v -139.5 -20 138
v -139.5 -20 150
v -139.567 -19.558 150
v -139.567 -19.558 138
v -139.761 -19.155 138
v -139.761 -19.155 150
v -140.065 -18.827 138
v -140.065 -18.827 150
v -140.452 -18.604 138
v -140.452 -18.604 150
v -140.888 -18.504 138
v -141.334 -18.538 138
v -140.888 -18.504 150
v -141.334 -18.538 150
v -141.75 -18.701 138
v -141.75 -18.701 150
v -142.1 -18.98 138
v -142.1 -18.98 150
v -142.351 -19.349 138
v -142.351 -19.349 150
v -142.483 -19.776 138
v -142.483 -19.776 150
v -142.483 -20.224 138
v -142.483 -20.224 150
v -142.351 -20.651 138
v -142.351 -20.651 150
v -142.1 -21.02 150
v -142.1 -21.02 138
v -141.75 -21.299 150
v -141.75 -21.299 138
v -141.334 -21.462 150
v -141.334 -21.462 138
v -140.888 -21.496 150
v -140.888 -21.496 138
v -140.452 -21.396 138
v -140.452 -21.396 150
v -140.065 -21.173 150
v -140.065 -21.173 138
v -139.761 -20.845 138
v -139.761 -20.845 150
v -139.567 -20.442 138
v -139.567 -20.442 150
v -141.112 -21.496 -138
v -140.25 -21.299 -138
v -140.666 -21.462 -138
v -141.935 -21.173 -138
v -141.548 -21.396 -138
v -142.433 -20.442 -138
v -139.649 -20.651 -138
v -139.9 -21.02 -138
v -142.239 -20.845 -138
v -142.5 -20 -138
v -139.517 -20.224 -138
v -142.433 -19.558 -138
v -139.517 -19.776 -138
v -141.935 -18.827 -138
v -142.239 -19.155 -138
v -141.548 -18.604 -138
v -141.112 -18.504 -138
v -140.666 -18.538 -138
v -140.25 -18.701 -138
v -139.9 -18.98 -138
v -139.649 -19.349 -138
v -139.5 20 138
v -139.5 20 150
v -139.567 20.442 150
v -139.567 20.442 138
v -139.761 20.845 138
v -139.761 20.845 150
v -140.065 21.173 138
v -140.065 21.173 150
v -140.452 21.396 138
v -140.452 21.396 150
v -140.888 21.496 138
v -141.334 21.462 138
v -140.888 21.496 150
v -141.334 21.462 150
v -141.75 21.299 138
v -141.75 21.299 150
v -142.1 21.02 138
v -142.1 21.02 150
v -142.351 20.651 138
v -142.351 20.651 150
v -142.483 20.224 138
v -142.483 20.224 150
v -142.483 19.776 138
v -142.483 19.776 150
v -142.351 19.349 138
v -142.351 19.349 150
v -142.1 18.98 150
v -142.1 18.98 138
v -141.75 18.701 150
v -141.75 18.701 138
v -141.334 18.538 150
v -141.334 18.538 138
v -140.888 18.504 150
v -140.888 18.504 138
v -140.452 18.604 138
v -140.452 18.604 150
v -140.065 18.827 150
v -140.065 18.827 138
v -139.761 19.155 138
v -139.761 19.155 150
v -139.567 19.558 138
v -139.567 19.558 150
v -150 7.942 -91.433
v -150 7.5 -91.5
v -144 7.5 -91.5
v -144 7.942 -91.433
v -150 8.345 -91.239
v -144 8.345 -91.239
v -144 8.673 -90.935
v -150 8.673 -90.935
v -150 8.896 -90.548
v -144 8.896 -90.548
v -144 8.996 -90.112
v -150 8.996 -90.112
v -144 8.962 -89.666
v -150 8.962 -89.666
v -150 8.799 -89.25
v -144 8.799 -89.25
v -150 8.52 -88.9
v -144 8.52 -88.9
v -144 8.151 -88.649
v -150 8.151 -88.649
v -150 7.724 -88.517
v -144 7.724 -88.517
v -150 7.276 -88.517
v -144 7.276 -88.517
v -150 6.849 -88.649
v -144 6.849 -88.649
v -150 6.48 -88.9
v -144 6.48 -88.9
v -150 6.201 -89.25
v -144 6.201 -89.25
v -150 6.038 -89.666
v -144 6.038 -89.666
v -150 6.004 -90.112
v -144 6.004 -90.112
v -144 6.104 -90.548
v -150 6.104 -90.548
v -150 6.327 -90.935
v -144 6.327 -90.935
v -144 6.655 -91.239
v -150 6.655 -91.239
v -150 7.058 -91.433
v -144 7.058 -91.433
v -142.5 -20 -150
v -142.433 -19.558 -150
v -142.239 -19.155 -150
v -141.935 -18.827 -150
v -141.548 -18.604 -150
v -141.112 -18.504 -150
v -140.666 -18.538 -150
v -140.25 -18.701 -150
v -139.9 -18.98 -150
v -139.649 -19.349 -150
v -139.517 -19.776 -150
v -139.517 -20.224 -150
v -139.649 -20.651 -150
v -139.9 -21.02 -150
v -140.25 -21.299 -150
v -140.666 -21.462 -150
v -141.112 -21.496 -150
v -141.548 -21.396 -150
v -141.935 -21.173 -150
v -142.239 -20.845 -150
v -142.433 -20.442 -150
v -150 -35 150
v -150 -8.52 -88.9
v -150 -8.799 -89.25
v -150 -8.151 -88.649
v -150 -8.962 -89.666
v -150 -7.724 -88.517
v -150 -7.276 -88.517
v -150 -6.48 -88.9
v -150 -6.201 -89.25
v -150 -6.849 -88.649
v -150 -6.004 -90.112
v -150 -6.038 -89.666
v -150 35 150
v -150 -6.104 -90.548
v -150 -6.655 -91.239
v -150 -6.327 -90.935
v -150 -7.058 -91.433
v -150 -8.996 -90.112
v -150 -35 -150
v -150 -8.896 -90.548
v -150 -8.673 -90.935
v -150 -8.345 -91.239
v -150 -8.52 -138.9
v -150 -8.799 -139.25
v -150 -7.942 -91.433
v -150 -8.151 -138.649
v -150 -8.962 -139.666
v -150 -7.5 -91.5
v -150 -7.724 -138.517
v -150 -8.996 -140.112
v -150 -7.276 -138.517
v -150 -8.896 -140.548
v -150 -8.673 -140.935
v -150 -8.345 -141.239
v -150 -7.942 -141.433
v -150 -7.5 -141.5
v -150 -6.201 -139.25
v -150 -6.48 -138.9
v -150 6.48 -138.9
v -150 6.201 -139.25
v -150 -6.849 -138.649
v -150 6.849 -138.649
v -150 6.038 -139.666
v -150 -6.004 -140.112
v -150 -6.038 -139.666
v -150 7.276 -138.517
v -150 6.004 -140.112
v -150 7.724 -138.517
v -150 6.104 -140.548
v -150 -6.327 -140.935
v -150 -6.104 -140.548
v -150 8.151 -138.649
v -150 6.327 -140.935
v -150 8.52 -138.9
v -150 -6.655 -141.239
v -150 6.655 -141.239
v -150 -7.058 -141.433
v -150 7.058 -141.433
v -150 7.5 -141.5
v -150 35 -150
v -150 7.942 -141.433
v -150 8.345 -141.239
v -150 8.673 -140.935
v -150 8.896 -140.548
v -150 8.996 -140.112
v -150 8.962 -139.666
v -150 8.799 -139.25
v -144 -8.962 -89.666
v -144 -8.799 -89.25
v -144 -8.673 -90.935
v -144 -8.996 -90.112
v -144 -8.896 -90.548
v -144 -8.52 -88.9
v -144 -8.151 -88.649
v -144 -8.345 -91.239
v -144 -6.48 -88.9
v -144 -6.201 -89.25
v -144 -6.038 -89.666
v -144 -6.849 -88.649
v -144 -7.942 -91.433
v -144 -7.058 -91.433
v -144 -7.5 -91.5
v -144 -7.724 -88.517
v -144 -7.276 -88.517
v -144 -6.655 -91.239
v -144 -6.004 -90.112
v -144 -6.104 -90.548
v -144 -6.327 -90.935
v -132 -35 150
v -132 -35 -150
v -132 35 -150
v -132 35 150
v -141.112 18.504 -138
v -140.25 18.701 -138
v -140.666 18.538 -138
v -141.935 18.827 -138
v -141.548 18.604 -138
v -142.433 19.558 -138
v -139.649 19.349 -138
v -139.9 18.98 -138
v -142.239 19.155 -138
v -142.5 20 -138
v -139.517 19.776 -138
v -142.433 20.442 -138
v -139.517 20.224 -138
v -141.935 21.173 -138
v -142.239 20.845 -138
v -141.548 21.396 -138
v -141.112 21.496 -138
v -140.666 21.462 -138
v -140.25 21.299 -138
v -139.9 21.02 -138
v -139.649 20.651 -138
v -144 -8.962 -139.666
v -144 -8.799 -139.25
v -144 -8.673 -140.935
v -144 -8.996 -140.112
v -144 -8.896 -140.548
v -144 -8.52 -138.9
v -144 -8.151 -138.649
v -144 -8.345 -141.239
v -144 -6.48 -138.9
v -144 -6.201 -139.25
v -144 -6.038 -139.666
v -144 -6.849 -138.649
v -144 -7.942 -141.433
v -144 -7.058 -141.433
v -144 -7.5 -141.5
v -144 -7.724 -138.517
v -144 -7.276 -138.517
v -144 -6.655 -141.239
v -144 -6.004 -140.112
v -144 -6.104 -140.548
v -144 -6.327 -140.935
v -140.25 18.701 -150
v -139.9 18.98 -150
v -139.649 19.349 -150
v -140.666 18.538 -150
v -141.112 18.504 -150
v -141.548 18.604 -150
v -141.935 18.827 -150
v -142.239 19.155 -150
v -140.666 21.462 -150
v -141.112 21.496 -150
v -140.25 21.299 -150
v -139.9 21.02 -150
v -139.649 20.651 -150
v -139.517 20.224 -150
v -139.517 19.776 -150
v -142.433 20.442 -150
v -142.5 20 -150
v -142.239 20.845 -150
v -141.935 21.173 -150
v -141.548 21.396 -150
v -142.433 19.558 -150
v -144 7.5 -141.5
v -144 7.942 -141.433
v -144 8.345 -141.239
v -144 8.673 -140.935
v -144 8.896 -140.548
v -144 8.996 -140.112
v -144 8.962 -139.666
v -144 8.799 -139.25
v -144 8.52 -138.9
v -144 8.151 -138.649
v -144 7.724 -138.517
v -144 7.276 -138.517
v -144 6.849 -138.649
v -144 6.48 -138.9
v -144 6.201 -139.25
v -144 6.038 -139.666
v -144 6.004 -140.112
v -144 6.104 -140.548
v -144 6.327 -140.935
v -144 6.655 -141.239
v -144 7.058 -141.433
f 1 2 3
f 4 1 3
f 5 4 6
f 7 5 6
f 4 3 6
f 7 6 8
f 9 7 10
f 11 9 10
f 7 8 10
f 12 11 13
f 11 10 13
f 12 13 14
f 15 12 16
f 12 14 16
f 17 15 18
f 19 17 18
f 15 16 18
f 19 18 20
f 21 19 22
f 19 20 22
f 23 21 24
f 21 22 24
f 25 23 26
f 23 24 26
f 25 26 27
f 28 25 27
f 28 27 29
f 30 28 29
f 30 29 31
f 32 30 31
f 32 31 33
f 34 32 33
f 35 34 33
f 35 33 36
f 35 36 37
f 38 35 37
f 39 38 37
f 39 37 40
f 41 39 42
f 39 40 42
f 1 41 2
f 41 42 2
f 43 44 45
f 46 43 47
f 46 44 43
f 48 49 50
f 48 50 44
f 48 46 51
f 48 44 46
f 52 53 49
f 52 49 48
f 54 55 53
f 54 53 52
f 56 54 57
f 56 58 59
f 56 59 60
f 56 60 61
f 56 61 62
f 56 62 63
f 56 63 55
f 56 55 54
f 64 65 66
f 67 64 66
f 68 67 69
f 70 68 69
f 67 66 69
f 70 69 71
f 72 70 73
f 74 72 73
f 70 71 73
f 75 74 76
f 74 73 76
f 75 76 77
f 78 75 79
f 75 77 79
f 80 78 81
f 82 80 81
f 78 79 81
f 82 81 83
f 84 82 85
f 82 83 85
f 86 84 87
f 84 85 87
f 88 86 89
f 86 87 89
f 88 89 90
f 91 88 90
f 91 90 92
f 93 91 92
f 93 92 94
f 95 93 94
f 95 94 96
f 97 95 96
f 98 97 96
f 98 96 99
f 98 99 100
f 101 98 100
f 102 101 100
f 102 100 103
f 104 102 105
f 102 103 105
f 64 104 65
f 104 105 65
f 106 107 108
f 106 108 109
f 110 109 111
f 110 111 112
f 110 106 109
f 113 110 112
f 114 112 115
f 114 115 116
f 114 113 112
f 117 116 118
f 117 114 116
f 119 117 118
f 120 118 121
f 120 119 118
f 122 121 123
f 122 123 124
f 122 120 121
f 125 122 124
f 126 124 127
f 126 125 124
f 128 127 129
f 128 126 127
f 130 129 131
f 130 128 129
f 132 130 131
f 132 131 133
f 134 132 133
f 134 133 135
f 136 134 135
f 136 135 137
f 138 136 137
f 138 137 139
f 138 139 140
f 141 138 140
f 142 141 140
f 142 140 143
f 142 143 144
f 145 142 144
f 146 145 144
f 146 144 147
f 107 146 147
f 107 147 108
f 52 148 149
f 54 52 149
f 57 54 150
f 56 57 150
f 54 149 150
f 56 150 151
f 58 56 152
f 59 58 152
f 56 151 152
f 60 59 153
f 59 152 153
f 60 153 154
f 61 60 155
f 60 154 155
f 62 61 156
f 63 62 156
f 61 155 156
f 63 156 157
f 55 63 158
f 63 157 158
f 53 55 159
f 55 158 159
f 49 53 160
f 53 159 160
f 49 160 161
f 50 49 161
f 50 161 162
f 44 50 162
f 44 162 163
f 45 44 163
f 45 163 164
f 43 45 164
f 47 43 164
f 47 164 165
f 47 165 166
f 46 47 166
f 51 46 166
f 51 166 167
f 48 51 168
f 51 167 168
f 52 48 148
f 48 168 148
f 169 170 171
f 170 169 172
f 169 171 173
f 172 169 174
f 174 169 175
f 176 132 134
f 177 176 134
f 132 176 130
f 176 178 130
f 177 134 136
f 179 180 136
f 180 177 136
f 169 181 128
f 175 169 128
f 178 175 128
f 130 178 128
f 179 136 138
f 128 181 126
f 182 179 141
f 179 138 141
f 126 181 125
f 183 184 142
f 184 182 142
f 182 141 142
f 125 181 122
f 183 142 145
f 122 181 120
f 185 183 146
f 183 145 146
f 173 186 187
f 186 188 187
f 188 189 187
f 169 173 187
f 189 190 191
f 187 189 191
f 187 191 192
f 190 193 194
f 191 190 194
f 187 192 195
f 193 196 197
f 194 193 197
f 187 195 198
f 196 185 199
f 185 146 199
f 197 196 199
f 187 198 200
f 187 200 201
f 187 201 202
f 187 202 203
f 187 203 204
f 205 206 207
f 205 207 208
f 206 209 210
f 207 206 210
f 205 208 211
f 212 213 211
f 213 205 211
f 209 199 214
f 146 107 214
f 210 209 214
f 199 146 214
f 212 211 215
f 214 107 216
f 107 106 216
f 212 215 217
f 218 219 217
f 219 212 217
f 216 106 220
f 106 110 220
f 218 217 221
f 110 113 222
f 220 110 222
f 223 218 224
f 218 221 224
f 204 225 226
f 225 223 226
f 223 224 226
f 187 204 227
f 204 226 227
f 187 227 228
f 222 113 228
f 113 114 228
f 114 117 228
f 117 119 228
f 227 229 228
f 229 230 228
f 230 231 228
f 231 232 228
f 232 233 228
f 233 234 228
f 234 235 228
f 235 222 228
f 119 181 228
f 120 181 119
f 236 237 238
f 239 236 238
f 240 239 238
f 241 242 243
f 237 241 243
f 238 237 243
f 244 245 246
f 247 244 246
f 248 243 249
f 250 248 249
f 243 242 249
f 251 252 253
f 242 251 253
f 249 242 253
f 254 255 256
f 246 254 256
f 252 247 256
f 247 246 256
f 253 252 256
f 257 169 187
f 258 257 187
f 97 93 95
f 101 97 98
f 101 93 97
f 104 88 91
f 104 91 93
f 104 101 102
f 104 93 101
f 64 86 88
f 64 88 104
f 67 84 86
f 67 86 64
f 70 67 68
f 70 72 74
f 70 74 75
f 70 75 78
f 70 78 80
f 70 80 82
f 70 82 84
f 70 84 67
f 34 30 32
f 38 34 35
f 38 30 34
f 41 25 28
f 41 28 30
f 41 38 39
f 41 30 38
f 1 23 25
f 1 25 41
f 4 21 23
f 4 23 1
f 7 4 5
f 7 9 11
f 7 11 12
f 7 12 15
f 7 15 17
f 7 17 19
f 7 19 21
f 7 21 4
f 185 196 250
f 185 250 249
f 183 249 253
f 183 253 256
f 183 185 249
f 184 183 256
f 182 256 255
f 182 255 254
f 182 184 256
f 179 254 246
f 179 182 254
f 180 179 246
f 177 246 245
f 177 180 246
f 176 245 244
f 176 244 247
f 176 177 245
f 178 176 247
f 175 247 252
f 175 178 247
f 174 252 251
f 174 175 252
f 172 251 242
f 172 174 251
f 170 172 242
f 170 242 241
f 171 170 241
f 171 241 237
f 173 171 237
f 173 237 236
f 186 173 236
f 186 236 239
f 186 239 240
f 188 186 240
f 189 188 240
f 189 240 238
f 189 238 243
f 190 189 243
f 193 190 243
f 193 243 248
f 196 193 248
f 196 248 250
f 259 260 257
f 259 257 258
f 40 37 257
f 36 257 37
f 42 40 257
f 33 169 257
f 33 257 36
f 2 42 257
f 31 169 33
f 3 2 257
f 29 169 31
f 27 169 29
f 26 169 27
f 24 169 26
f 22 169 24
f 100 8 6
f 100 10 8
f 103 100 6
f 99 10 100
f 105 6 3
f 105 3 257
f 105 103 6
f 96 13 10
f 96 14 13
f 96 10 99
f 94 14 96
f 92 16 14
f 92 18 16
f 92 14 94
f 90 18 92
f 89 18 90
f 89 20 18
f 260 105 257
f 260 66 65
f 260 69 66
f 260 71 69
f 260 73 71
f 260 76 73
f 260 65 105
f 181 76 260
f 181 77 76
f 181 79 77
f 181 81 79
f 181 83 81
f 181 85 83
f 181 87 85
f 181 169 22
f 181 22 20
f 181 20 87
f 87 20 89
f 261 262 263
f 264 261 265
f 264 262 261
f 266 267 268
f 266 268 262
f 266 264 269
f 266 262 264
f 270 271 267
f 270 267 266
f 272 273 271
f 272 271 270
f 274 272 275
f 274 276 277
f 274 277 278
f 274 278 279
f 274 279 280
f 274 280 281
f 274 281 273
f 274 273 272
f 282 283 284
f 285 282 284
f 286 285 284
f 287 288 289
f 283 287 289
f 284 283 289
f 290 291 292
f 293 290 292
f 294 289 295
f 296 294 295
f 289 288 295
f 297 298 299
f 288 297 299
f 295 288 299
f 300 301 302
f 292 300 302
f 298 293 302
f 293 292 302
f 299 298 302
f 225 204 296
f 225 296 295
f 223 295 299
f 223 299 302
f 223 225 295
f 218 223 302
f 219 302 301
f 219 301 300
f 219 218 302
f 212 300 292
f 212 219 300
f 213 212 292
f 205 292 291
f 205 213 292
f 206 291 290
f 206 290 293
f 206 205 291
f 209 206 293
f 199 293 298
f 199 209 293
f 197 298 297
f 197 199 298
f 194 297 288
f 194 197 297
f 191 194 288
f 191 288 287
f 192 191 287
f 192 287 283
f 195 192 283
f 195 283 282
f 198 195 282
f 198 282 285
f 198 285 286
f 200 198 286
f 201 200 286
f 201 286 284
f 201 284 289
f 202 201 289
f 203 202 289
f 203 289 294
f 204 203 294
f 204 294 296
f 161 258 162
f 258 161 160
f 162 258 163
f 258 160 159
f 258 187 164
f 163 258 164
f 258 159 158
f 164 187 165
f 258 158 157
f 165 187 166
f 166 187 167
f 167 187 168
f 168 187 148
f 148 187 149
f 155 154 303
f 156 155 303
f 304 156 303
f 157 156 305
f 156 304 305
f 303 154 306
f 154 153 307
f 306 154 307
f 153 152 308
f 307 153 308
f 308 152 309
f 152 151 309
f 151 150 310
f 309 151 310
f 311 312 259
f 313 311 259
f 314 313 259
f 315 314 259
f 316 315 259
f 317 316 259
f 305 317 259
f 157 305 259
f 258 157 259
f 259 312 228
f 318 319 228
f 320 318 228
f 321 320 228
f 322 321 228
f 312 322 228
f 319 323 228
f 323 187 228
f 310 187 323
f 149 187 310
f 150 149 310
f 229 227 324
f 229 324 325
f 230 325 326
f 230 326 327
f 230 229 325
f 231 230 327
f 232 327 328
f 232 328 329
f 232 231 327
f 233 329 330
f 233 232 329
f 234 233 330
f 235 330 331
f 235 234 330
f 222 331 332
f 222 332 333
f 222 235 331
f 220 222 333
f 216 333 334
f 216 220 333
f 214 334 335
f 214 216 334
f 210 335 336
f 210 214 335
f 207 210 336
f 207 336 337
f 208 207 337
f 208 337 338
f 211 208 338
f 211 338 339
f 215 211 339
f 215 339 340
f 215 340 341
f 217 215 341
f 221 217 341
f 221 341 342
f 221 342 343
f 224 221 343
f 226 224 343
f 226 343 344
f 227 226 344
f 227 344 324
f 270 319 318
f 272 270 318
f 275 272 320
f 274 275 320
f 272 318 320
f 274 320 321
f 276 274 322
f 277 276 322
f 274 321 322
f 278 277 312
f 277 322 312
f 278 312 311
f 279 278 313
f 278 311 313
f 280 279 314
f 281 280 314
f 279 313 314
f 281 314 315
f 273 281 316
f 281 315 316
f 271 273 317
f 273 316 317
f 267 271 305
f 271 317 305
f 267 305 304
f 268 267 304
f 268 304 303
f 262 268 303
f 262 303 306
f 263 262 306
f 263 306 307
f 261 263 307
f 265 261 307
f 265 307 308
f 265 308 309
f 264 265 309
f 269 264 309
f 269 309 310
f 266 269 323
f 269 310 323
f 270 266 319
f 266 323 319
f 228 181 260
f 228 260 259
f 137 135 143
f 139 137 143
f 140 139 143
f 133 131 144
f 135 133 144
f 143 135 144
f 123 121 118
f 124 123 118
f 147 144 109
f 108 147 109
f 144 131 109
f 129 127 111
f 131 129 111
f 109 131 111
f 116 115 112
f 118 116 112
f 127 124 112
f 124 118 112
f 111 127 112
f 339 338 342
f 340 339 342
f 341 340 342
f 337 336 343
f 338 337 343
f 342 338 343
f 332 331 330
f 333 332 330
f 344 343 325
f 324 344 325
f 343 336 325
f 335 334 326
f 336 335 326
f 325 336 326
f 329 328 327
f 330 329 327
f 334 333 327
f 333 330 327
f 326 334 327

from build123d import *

# Parameters (mm, degrees)
CROQUIS7_W              = 300
CROQUIS7_H              = 70
CROQUIS7_R              = 1.5
SALIENTE_EXTRUIR4_DEPTH = 18
CROQUIS8_R              = 1.5
CORTAR_EXTRUIR1_DEPTH   = 12
CROQUIS9_R              = 1.5
CORTAR_EXTRUIR2_DEPTH   = 12
CROQUIS14_R             = 1.5
SALIENTE_EXTRUIR9_DEPTH = 12


with BuildPart() as part:
    # Croquis7 → Saliente-Extruir4 (new body)
    with BuildSketch(Plane(origin=(-150, 0, 0), x_dir=(0, 0, -1), z_dir=(1, 0, 0))):
        Rectangle(CROQUIS7_W, CROQUIS7_H)
        with Locations((90, 7.5)):
            Circle(CROQUIS7_R, mode=Mode.SUBTRACT)
        with Locations((140, 7.5)):
            Circle(CROQUIS7_R, mode=Mode.SUBTRACT)
        with Locations((90, -7.5)):
            Circle(CROQUIS7_R, mode=Mode.SUBTRACT)
        with Locations((140, -7.5)):
            Circle(CROQUIS7_R, mode=Mode.SUBTRACT)
    extrude(amount=SALIENTE_EXTRUIR4_DEPTH)

    # Croquis8 → Cortar-Extruir1 (cut)
    with BuildSketch(Plane.XY.offset(150)):
        with Locations((-141, -20)):
            Circle(CROQUIS8_R)
        with Locations((-141, 20)):
            Circle(CROQUIS8_R)
    extrude(amount=-CORTAR_EXTRUIR1_DEPTH, mode=Mode.SUBTRACT)

    # Croquis9 → Cortar-Extruir2 (cut)
    with BuildSketch(Plane(origin=(0, 0, -150), x_dir=(-1, 0, 0), z_dir=(0, 0, -1))):
        with Locations((141, -20)):
            Circle(CROQUIS9_R)
        with Locations((141, 20)):
            Circle(CROQUIS9_R)
    extrude(amount=-CORTAR_EXTRUIR2_DEPTH, mode=Mode.SUBTRACT)

    # Croquis14 → Saliente-Extruir9 (add)
    with BuildSketch(Plane(origin=(-132, 0, 0), x_dir=(0, 0, -1), z_dir=(1, 0, 0))):
        with Locations((140, -7.5)):
            Circle(CROQUIS14_R)
        with Locations((140, 7.5)):
            Circle(CROQUIS14_R)
        with Locations((90, -7.5)):
            Circle(CROQUIS14_R)
        with Locations((90, 7.5)):
            Circle(CROQUIS14_R)
    extrude(amount=-SALIENTE_EXTRUIR9_DEPTH)


solid = part.part
